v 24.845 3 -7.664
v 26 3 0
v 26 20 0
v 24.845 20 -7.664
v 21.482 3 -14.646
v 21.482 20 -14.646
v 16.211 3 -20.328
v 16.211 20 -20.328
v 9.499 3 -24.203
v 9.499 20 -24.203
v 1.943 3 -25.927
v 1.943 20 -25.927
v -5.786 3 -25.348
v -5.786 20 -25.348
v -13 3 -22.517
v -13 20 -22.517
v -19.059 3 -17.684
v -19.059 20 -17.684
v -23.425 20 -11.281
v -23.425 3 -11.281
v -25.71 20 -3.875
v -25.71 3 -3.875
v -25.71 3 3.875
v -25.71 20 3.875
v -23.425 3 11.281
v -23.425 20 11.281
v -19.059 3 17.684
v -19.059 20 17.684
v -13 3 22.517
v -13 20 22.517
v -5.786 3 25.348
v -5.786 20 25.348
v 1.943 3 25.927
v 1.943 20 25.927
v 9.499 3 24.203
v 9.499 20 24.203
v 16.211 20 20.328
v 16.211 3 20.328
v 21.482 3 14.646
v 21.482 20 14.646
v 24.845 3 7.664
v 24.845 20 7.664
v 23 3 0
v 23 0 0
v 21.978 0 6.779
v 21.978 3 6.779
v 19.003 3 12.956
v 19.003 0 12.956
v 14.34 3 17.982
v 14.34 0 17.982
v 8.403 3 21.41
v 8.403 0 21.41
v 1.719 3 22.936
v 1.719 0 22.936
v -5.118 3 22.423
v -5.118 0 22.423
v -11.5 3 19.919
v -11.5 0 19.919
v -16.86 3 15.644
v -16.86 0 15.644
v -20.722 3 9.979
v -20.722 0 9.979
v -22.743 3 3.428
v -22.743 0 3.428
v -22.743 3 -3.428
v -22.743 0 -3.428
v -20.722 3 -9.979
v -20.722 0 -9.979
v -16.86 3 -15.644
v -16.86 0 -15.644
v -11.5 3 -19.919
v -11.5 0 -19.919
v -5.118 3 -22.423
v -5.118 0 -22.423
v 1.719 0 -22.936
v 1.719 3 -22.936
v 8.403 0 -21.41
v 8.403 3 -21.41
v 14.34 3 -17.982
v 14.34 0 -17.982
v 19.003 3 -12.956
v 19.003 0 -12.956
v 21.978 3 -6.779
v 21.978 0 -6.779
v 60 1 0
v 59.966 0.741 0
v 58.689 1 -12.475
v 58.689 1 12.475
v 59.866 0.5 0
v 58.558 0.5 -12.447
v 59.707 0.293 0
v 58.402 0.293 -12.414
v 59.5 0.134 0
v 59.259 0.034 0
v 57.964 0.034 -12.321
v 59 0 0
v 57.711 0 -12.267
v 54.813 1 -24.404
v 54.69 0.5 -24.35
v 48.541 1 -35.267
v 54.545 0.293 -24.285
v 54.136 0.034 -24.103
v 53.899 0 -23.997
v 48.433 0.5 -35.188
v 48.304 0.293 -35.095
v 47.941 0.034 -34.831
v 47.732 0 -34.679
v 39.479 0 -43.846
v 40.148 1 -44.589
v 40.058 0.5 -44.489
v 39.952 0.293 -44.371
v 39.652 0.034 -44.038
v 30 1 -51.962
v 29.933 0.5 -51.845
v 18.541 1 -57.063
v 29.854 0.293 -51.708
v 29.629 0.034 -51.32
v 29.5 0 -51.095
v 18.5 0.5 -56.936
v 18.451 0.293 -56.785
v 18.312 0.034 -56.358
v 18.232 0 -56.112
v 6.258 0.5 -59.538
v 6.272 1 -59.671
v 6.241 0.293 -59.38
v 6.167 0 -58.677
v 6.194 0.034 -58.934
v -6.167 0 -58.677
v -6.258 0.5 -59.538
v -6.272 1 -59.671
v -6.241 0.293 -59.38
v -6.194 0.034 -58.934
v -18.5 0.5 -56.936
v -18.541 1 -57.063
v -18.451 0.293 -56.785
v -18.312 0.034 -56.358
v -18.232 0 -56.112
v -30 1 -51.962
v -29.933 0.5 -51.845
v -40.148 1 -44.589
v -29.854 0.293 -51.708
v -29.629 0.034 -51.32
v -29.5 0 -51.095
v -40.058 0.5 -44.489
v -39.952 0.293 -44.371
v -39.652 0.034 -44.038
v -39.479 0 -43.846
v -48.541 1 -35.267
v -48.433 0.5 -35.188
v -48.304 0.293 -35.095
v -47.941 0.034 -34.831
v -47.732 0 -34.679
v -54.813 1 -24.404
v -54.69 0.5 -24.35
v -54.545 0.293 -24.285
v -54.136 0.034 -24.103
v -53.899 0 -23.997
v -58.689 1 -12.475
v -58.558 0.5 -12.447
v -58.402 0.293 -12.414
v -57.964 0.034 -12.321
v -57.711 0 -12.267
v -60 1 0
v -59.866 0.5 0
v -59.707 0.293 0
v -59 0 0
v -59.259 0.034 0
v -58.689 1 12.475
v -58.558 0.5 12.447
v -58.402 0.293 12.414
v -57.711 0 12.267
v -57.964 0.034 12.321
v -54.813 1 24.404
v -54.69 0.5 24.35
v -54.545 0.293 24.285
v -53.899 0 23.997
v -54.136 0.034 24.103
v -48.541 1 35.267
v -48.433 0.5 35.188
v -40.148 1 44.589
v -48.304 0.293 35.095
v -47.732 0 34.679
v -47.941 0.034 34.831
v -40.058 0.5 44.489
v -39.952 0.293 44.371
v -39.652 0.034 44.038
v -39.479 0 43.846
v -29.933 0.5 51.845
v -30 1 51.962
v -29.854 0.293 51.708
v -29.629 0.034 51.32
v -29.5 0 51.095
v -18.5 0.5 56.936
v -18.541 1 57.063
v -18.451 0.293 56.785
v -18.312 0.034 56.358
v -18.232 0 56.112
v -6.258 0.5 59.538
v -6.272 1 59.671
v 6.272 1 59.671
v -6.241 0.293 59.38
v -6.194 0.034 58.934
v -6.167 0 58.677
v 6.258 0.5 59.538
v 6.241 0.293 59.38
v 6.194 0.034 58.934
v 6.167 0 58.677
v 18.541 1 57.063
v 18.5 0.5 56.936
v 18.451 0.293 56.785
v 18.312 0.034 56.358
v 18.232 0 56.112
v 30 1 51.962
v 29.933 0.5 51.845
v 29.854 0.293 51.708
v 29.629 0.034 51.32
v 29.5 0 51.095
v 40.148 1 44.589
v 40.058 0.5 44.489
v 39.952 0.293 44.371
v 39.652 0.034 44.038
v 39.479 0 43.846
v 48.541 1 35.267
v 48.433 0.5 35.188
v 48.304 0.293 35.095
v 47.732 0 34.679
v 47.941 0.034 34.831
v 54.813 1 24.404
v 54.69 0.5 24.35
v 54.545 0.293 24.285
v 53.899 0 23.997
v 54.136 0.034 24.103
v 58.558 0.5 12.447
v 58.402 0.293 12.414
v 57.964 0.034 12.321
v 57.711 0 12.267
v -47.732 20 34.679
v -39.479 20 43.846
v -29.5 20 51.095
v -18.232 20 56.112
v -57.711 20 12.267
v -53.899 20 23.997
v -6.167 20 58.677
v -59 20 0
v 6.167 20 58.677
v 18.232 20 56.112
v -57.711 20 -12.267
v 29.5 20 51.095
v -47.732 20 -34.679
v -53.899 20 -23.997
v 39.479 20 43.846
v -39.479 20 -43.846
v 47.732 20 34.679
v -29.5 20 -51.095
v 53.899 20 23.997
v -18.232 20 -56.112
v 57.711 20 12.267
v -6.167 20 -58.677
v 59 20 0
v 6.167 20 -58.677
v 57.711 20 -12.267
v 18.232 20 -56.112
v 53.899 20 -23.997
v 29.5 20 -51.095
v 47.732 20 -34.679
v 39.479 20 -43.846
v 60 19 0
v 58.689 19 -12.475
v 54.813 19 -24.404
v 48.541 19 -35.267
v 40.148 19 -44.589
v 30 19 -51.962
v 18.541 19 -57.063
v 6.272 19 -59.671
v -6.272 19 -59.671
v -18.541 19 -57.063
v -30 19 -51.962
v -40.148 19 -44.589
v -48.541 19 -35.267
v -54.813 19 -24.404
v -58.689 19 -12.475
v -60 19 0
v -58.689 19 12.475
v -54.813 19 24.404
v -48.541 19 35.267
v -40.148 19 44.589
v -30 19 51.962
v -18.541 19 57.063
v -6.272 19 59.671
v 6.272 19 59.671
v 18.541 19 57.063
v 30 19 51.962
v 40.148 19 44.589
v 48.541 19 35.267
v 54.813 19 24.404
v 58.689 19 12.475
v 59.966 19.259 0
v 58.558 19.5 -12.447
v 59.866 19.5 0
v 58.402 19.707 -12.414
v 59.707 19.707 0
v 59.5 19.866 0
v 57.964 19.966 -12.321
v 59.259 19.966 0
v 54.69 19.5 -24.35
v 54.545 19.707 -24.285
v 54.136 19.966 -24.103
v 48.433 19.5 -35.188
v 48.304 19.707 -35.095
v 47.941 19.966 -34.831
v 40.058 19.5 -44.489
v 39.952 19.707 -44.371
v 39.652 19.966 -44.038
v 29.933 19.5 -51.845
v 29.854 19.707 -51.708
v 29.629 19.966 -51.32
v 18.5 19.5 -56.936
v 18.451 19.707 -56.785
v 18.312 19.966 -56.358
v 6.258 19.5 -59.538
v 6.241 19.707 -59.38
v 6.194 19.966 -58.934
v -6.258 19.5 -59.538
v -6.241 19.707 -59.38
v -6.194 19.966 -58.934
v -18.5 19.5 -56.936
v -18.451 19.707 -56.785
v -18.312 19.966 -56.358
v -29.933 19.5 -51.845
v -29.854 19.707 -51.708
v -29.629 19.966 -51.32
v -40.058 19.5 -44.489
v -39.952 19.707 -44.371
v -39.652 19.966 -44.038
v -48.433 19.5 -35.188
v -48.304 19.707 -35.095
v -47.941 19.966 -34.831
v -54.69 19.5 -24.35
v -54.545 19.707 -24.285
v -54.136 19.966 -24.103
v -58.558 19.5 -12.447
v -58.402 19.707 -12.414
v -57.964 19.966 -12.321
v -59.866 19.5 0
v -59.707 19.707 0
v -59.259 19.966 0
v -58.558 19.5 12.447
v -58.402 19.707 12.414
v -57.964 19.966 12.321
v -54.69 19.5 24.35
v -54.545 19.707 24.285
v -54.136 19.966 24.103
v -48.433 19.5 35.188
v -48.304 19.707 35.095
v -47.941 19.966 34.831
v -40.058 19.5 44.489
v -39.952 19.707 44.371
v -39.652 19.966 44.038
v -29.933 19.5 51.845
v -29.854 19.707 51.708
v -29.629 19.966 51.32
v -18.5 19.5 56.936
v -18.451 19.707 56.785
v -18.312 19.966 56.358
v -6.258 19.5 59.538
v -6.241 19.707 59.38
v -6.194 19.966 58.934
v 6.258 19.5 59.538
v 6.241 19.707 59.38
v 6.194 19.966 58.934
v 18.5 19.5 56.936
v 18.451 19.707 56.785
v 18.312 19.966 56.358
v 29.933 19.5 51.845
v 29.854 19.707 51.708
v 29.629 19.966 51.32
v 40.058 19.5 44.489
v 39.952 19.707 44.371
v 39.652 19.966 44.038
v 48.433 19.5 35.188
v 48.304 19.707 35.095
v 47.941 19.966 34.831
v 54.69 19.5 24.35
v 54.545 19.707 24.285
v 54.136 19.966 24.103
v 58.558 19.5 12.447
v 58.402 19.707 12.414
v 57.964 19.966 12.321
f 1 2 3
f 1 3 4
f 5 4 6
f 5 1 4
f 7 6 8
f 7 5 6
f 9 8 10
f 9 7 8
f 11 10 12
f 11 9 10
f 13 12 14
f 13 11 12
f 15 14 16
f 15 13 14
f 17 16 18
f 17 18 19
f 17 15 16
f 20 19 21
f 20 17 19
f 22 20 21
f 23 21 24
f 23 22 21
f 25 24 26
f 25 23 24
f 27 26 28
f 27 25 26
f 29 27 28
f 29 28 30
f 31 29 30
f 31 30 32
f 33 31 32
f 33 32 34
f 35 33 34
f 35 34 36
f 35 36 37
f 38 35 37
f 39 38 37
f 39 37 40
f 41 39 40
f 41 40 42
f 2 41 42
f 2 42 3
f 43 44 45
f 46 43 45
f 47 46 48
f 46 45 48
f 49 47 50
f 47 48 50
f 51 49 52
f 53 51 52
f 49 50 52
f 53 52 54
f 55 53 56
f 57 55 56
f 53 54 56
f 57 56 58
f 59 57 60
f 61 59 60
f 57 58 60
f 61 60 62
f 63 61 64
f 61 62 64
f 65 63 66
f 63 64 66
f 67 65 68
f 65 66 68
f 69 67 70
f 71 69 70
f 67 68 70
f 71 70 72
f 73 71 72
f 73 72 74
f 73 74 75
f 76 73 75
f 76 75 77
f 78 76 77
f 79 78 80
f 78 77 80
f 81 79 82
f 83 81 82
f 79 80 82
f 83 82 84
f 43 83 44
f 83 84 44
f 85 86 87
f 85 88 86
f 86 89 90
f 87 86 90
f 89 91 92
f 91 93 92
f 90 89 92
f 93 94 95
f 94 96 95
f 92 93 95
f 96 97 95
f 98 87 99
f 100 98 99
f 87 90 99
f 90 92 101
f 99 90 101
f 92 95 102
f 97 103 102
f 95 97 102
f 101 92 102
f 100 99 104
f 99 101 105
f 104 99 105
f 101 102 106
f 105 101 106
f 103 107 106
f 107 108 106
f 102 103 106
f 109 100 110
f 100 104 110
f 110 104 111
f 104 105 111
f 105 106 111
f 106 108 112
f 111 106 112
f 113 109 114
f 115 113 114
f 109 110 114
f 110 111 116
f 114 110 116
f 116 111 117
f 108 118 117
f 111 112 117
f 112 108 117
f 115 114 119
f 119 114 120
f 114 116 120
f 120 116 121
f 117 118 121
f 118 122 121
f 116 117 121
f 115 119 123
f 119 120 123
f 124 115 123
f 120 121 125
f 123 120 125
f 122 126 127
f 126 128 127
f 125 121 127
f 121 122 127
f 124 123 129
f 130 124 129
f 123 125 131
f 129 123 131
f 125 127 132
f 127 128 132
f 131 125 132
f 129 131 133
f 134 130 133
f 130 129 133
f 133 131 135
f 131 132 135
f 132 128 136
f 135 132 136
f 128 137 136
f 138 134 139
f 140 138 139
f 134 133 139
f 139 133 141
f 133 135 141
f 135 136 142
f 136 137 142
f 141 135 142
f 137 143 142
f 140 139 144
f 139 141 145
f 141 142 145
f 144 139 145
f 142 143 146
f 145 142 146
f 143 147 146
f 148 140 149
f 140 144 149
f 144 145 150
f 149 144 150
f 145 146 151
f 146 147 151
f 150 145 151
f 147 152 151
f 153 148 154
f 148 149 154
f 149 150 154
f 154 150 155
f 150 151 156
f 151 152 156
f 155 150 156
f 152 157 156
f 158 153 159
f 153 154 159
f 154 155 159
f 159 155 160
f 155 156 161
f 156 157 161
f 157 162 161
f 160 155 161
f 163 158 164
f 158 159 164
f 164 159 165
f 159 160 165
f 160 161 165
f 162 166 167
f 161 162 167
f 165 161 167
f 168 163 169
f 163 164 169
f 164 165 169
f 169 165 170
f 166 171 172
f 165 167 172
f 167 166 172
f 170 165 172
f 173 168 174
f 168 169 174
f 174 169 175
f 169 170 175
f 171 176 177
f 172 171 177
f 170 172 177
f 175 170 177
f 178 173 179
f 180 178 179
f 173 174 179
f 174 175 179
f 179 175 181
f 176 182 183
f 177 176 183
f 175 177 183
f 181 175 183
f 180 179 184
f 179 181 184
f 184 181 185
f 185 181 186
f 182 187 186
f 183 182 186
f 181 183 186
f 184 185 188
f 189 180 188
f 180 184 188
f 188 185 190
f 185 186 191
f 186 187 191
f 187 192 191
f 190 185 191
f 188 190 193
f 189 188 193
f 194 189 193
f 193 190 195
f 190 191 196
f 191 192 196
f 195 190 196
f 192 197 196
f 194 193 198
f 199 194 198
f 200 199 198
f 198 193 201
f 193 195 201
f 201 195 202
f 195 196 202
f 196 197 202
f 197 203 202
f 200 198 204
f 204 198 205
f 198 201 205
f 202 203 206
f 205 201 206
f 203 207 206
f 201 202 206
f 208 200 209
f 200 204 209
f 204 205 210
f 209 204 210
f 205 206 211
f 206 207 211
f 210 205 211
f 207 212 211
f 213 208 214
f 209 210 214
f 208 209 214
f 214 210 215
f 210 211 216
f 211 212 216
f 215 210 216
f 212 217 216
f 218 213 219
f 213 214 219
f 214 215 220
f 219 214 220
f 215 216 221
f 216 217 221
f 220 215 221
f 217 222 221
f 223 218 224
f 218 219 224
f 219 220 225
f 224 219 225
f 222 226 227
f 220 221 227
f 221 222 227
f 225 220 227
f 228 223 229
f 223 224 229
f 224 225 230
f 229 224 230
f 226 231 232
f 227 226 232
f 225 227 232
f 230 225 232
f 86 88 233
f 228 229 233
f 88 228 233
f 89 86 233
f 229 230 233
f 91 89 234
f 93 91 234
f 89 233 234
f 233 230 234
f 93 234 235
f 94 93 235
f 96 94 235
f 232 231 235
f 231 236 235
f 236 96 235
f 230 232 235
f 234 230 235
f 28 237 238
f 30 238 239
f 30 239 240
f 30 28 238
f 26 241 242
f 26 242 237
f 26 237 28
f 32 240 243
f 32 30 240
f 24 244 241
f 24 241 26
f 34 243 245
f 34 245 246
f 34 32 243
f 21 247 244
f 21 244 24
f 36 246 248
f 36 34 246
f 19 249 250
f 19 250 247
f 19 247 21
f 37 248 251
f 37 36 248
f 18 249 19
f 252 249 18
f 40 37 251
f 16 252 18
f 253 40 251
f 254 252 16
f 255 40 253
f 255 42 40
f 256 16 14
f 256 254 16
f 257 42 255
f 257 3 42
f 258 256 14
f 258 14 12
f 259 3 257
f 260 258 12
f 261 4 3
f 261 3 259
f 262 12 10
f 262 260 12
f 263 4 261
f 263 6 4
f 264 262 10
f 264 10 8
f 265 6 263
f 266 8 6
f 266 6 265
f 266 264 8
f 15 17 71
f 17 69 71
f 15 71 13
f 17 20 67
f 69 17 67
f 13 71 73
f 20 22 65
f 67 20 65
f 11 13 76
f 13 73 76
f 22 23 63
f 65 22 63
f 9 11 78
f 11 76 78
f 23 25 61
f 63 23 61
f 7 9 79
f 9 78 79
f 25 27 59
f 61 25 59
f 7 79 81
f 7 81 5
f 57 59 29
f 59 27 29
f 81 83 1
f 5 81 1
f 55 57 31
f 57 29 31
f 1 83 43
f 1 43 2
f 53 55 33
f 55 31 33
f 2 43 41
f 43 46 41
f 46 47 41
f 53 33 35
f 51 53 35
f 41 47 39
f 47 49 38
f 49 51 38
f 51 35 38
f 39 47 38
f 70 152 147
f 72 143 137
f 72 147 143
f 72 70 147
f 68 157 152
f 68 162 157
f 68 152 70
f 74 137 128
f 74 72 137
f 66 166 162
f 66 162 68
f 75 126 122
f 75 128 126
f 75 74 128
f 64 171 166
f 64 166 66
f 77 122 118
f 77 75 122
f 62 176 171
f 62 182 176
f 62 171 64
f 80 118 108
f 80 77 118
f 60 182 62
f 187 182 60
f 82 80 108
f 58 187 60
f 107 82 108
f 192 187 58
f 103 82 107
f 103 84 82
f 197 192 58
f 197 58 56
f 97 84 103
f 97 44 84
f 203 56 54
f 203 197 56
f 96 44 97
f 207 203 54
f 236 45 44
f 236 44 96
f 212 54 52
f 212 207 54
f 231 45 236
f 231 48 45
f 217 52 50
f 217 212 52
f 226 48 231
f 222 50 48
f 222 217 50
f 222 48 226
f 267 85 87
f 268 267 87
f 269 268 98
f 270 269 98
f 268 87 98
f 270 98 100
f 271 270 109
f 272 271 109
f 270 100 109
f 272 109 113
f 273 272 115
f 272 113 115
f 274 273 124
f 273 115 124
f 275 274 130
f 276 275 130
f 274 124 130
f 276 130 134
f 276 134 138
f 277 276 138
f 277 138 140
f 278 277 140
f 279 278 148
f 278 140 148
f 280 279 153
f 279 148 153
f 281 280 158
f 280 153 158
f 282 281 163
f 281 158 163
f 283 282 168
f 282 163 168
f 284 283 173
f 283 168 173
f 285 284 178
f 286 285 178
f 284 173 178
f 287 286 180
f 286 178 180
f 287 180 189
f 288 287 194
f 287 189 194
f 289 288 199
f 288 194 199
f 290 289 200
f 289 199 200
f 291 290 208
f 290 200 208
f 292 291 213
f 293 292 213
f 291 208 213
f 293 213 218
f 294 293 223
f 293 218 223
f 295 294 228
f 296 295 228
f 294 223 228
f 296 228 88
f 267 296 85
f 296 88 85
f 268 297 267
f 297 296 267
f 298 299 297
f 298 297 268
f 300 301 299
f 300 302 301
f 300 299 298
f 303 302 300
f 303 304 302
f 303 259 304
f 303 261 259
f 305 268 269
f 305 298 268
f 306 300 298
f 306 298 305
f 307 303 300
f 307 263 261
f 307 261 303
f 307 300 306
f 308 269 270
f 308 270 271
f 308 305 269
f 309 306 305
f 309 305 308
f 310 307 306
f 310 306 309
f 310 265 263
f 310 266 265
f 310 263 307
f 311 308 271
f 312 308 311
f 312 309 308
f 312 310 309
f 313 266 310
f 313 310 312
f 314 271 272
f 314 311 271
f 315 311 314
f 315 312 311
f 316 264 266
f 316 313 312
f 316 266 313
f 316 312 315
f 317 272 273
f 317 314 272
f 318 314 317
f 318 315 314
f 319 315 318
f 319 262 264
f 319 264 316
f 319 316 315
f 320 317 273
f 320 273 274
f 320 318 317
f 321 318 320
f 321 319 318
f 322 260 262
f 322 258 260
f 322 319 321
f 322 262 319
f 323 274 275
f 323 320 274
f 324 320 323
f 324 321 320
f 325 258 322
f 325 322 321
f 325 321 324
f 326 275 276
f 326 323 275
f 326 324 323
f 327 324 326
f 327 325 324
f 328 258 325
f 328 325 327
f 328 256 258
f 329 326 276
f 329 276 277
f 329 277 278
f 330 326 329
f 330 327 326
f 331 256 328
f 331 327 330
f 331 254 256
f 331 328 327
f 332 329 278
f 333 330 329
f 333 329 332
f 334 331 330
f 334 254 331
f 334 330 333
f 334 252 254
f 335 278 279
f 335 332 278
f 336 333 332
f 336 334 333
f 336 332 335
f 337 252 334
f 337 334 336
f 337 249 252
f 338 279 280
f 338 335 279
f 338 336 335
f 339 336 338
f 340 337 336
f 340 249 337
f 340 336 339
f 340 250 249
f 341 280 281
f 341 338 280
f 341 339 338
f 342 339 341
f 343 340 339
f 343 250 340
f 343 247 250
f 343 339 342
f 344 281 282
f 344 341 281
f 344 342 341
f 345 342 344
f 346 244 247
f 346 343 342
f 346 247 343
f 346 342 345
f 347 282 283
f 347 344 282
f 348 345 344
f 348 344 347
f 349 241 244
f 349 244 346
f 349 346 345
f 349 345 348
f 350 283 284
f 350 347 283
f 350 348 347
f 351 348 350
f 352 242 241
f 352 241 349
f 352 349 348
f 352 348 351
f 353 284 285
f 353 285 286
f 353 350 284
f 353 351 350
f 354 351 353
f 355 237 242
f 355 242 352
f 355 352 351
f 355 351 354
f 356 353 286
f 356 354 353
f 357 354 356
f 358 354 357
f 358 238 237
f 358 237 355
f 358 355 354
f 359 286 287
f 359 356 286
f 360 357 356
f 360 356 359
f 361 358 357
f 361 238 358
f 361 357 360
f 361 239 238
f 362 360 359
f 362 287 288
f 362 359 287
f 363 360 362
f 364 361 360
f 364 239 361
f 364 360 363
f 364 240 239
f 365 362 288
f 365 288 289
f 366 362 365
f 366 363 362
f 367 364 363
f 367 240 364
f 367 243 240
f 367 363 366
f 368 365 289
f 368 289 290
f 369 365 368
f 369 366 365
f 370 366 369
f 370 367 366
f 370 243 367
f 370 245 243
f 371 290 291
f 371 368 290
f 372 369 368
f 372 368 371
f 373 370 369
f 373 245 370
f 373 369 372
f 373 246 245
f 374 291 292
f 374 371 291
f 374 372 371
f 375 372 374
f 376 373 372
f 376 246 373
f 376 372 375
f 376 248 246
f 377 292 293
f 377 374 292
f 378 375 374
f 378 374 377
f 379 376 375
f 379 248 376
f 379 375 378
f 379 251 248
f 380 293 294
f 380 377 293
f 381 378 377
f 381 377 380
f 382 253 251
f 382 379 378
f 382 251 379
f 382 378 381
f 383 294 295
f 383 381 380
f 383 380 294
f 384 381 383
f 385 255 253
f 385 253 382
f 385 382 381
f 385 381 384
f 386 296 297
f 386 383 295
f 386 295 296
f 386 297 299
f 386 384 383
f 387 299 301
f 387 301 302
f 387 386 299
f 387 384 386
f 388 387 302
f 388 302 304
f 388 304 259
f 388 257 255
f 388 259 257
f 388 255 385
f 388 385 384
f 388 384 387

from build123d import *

# Parameters (mm, degrees)
SKETCH_1_R      = 60
SKETCH_1_R_2    = 26
EXTRUDE_1_DEPTH = 20
FILLET_1_R      = 1
SKETCH_2_R      = 26
SKETCH_2_R_2    = 23
EXTRUDE_2_DEPTH = 3


with BuildPart() as part:
    # 草图1 → 凸台-拉伸1 (new body)
    with BuildSketch(Plane(origin=(0, 0, 0), x_dir=(1, 0, 0), z_dir=(0, 1, 0))):
        Circle(SKETCH_1_R)
        Circle(SKETCH_1_R_2, mode=Mode.SUBTRACT)
    extrude(amount=EXTRUDE_1_DEPTH)

    # 圆角1
    fillet_1_edges = [part.edges().sort_by_distance(p)[0] for p in [
        (-60, 0, 0),
        (-60, 20, 0),
    ]]
    fillet(fillet_1_edges, radius=FILLET_1_R)

    # 草图2 → 凸台-拉伸2 (add)
    with BuildSketch(Plane.XZ):
        Circle(SKETCH_2_R)
        Circle(SKETCH_2_R_2, mode=Mode.SUBTRACT)
    extrude(amount=-EXTRUDE_2_DEPTH)


solid = part.part
